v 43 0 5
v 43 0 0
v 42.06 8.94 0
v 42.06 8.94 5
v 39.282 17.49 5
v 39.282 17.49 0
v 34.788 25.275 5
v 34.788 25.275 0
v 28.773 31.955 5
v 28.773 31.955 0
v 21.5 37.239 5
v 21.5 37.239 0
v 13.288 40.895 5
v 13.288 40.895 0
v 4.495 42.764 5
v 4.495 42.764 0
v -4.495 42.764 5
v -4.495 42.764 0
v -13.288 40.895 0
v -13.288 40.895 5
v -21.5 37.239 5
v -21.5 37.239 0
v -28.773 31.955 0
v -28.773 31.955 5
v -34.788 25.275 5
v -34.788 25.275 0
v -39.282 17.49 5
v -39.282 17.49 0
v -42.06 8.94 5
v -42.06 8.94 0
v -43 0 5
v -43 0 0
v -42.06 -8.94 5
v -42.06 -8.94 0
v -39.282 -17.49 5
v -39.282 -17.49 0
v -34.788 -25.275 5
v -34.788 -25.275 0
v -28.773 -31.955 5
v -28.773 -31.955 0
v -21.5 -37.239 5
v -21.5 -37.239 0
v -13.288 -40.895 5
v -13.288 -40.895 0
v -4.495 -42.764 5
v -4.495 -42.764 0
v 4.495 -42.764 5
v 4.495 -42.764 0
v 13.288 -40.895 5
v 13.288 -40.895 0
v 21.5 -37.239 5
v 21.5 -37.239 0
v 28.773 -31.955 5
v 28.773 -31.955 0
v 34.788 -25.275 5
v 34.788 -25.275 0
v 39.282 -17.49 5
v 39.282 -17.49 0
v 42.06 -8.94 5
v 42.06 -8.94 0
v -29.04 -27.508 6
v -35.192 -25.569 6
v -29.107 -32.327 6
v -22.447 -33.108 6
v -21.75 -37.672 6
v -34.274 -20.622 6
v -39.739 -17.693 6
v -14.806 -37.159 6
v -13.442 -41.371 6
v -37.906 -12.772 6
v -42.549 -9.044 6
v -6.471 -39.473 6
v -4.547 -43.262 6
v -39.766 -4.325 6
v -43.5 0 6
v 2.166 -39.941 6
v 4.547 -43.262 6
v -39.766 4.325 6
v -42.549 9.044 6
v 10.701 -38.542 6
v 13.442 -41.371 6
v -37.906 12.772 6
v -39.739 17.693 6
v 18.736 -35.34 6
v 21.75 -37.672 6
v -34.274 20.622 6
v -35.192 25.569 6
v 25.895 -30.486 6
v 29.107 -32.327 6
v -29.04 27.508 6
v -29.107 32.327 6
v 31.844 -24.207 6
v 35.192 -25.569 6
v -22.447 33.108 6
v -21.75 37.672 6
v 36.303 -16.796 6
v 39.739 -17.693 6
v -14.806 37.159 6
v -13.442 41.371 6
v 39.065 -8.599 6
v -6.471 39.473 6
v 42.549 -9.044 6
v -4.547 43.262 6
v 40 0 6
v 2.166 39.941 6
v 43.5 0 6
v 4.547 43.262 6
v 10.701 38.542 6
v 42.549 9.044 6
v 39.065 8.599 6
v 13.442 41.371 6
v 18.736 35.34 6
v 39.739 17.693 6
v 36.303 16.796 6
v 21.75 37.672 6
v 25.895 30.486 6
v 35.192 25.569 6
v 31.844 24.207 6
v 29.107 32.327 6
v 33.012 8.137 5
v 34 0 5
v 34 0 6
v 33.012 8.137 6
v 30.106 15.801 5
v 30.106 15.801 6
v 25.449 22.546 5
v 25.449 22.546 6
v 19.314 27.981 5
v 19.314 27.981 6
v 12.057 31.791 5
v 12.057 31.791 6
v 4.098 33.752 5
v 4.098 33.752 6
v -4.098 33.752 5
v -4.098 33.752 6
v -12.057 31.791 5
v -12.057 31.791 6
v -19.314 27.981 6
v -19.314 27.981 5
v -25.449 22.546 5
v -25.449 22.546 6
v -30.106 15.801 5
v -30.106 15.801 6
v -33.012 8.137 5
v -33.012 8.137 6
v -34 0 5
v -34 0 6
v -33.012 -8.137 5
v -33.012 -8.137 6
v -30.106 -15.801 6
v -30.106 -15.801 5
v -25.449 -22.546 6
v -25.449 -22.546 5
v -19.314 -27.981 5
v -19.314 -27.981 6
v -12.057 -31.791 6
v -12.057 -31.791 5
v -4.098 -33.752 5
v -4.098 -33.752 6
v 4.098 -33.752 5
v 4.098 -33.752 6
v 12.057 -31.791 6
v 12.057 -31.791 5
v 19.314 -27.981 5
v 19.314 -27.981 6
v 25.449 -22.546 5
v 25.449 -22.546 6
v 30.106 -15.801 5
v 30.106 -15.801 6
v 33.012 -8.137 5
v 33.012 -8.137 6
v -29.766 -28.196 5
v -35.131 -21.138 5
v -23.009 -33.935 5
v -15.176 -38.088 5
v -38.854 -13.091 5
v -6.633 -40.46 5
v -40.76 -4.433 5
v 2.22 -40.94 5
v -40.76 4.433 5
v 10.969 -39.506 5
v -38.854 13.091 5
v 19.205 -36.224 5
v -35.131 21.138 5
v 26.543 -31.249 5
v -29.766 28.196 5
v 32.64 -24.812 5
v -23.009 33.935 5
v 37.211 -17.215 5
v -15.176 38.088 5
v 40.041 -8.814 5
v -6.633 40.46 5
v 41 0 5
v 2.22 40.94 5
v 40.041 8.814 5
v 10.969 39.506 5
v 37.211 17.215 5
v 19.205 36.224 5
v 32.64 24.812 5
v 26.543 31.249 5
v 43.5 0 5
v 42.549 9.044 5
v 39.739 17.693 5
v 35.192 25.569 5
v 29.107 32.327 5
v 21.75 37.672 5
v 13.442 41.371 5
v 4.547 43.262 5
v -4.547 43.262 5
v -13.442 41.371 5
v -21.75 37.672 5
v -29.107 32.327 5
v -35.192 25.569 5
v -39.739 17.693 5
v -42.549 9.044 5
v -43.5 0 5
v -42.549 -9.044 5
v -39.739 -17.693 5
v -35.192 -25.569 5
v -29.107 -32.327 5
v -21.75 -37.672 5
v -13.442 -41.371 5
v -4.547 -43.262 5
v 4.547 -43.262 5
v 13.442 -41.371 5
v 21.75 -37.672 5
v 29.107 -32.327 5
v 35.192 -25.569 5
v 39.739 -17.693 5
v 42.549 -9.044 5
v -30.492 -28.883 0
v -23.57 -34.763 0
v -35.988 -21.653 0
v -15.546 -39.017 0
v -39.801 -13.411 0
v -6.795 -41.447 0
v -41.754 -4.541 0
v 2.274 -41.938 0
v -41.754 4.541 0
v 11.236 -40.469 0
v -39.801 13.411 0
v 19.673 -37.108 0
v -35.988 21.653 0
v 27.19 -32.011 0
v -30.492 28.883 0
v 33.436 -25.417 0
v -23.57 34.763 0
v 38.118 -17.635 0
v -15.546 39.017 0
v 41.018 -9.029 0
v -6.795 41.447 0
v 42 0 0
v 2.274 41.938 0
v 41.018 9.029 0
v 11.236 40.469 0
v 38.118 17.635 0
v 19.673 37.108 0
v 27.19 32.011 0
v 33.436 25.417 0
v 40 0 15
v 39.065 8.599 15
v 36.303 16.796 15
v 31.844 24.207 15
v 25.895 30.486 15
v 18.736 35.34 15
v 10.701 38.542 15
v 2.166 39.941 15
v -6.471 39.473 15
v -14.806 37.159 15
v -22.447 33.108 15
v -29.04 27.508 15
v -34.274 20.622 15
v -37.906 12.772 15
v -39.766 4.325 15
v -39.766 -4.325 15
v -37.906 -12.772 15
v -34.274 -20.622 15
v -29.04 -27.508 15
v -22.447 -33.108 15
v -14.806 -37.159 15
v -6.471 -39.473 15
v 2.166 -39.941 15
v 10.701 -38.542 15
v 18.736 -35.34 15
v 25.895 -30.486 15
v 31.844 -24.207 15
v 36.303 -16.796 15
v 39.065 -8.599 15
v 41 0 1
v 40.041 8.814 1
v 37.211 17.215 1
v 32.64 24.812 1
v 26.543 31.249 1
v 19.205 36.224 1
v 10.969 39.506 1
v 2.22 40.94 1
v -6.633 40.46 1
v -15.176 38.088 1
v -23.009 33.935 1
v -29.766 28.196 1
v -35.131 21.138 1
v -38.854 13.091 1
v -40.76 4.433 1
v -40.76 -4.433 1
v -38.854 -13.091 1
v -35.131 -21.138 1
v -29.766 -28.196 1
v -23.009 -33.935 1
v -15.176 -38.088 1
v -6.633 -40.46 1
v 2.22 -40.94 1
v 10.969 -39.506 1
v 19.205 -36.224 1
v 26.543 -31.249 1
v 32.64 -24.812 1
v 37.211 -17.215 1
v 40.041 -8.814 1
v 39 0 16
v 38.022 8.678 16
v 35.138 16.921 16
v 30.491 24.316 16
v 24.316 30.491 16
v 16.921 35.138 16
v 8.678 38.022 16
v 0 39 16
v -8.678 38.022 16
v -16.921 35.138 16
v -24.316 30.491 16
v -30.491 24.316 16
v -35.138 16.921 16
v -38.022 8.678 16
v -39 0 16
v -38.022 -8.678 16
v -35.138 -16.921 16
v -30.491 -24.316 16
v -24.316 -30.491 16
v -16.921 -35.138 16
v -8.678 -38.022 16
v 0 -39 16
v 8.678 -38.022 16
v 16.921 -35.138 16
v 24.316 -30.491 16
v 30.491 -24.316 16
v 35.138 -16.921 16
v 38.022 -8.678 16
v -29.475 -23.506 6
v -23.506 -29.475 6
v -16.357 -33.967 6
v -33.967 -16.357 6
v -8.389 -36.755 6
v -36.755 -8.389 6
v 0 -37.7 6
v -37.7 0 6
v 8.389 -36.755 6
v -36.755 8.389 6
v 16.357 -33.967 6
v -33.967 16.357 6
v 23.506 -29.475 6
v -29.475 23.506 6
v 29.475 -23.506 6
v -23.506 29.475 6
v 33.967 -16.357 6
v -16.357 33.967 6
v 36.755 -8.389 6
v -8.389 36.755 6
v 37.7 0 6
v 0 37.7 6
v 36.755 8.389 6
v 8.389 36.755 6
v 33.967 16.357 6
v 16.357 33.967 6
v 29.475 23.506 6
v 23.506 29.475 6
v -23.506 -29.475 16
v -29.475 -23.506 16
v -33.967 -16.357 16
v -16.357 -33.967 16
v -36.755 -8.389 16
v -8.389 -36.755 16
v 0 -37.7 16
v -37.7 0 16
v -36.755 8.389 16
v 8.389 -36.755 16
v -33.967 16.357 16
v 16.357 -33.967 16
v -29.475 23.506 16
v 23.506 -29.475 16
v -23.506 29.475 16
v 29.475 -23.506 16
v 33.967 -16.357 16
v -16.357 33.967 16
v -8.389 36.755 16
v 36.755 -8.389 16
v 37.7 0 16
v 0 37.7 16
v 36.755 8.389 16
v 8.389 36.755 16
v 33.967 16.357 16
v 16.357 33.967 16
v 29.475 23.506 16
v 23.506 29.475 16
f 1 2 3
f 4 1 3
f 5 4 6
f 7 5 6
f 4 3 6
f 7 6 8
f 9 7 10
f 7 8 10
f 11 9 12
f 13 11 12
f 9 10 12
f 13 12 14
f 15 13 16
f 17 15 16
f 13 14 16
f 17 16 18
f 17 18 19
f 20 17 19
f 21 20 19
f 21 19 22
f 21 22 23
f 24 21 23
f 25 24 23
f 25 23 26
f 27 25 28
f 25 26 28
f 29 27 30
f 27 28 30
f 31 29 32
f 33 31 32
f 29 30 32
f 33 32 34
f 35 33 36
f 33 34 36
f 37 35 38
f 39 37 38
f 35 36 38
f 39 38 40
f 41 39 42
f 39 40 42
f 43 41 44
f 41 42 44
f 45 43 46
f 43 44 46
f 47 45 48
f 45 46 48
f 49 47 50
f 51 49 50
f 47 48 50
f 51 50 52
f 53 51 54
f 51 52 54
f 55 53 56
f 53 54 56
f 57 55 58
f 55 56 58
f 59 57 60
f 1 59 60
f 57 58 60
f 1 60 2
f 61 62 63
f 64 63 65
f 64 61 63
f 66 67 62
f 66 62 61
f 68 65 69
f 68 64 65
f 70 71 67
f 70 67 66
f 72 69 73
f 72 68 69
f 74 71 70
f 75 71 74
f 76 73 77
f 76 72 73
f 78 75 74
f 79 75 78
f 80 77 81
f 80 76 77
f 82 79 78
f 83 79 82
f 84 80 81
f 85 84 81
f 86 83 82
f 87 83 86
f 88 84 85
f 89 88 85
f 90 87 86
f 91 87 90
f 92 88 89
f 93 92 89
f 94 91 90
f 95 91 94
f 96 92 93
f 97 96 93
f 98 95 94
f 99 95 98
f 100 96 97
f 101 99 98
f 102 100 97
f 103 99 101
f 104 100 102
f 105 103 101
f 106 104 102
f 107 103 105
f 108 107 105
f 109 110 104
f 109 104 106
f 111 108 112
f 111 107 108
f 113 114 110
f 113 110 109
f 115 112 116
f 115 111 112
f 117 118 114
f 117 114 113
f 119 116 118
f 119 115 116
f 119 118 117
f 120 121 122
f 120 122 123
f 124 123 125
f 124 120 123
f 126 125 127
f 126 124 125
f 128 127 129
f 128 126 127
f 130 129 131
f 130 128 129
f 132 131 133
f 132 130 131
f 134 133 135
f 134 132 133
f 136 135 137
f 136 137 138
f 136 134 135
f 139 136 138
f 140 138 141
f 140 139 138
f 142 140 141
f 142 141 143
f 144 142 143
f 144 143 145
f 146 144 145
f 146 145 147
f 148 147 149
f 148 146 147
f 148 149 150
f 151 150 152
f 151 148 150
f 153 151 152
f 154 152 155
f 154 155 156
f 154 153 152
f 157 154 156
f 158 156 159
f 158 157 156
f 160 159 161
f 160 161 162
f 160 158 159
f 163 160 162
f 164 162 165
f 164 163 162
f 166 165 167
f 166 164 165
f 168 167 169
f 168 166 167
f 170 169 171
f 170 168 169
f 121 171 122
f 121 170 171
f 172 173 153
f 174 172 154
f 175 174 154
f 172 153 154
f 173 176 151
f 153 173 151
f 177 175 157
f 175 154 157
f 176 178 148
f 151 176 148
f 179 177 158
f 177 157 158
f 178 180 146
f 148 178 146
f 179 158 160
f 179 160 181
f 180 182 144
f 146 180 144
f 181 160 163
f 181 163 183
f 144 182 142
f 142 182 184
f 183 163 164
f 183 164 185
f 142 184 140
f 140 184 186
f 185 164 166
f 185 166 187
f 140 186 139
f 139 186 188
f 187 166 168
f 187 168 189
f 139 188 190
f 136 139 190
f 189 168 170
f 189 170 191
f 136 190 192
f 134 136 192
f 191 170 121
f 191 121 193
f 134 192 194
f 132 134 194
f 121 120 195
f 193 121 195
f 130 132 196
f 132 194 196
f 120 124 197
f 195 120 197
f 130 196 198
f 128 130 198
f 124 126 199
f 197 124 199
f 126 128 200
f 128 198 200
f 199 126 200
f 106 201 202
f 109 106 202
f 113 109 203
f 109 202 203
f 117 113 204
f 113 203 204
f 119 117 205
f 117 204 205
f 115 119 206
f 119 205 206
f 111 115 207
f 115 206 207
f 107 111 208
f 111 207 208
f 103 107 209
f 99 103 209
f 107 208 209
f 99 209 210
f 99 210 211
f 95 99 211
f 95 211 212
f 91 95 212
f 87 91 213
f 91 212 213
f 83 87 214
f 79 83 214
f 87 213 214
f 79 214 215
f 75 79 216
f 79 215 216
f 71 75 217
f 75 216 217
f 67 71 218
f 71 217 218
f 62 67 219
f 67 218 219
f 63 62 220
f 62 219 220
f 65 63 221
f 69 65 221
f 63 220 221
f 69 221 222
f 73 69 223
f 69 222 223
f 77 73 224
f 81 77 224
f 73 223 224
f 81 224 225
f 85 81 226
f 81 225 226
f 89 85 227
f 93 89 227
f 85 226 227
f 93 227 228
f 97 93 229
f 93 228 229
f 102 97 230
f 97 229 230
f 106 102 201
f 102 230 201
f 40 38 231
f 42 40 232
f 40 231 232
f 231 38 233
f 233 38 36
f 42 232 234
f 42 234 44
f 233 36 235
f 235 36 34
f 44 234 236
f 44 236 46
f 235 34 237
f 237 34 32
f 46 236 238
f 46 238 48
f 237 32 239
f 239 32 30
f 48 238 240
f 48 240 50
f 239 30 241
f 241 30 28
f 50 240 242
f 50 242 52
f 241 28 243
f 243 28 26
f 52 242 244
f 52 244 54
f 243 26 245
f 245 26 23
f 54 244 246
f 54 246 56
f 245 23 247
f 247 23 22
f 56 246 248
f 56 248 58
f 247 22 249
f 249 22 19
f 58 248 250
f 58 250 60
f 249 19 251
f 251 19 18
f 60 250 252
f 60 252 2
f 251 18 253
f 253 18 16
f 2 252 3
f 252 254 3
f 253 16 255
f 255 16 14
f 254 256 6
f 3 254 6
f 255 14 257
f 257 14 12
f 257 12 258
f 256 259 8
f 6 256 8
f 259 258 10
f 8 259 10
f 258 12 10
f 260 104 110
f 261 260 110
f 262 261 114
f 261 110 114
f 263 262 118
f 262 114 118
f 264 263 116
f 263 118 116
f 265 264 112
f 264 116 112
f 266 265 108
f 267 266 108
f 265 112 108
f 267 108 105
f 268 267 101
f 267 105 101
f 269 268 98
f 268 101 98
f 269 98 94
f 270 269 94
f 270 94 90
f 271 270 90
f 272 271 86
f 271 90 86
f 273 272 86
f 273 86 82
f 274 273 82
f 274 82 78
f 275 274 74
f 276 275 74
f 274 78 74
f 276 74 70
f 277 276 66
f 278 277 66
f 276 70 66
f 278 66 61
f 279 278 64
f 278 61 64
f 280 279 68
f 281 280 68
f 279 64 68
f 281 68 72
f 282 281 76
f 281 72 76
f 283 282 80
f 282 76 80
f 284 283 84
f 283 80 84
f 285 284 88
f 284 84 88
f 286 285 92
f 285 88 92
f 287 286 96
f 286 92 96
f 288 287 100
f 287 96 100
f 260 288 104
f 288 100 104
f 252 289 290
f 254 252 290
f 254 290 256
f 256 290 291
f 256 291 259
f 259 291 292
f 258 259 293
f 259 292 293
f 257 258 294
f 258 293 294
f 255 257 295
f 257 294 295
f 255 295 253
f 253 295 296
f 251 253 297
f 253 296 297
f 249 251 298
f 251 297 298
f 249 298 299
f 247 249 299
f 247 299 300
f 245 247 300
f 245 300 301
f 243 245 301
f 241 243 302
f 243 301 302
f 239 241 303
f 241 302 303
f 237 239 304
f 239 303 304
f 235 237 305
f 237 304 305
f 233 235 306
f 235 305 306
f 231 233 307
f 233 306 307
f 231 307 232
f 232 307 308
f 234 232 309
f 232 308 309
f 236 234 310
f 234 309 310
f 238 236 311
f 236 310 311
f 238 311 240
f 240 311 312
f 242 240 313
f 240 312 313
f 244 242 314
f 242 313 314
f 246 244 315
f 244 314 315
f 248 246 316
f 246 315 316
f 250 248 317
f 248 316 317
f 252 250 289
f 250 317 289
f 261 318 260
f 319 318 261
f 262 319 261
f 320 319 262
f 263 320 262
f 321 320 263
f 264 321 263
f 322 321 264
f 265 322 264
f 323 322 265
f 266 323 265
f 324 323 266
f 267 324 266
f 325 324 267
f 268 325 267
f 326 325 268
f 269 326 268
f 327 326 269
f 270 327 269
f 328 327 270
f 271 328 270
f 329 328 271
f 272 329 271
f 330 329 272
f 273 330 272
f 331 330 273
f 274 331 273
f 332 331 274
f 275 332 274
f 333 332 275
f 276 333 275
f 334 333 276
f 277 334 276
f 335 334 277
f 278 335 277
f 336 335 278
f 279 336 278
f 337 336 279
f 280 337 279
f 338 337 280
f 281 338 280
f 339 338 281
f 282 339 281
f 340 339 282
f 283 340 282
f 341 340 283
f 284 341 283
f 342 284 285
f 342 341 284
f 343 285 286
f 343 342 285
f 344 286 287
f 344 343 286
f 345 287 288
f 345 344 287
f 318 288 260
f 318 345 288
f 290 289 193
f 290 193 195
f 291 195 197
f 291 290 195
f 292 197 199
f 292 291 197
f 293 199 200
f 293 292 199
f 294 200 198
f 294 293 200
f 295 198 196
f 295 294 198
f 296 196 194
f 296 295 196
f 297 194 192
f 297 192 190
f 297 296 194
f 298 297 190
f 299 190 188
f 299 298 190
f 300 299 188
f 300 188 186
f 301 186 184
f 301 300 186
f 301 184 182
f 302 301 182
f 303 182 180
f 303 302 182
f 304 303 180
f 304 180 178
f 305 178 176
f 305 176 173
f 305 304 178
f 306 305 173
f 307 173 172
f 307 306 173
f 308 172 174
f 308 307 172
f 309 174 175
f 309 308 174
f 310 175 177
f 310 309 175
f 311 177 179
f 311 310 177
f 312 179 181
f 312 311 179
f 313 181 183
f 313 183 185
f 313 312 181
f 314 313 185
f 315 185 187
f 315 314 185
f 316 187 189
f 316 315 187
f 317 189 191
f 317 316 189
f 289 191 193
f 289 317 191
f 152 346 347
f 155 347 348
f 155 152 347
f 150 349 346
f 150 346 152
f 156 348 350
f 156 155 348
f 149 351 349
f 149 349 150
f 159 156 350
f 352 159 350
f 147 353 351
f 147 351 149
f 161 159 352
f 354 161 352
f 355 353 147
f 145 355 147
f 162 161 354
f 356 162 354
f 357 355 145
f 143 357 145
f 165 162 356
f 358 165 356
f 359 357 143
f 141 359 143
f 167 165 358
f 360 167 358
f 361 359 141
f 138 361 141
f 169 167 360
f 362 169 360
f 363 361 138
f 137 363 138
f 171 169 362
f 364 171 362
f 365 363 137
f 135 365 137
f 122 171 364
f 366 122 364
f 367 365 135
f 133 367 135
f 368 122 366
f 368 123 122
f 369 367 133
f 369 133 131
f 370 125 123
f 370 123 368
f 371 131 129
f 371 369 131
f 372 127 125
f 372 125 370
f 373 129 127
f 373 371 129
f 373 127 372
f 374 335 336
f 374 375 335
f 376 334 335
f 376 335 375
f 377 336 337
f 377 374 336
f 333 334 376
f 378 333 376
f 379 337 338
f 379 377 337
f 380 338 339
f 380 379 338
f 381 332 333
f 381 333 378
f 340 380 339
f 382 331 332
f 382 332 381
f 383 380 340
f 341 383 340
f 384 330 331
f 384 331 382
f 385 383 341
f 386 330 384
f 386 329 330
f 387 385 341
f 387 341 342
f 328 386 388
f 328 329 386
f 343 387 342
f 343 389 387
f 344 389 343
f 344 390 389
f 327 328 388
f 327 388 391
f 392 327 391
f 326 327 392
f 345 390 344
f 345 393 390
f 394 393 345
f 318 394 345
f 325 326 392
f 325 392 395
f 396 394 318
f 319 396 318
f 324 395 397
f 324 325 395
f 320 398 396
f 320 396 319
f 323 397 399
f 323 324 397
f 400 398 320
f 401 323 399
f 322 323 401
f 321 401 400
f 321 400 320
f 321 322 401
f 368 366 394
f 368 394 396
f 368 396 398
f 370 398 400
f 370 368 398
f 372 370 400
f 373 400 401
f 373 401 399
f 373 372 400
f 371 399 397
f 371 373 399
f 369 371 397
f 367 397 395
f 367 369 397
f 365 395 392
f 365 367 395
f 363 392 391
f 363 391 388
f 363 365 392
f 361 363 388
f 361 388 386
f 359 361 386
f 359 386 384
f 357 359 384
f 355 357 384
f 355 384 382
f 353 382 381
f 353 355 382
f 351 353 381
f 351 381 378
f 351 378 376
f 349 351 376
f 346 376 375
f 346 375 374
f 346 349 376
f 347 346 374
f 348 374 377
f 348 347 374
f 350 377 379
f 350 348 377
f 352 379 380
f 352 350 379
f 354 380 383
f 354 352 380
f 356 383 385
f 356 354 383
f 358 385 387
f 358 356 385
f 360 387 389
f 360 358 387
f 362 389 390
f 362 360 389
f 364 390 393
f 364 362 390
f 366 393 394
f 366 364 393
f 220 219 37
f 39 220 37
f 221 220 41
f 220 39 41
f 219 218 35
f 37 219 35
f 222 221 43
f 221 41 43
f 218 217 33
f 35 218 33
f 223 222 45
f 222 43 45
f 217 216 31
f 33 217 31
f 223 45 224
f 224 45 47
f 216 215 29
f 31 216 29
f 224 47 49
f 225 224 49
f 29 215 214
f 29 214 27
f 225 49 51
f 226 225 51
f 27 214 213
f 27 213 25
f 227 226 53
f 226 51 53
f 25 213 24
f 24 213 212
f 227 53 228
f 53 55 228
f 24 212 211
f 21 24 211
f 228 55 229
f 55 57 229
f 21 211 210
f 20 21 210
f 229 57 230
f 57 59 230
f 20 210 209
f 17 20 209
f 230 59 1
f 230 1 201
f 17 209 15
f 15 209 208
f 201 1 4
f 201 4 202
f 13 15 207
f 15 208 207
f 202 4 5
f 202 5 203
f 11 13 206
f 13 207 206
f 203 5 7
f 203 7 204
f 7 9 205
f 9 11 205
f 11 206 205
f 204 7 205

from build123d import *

# Parameters (mm, degrees)
SKETCH_R        = 43
SKETCH_R_2      = 41
PAD_DEPTH       = 5
SKETCH001_R     = 43.5
SKETCH001_R_2   = 34
PAD001_DEPTH    = 1
SKETCH002_R     = 40
SKETCH002_R_2   = 37.7
PAD002_DEPTH    = 10
CHAMFER_SIZE    = 1
CHAMFER001_SIZE = 1


with BuildPart() as part:
    # Sketch → Pad (new body)
    with BuildSketch(Plane.XY):
        Circle(SKETCH_R)
        Circle(SKETCH_R_2, mode=Mode.SUBTRACT)
    extrude(amount=PAD_DEPTH)

    # Sketch001 (on Face4 of Pad) → Pad001 (join)
    with BuildSketch(Plane.XY.offset(5)):
        Circle(SKETCH001_R)
        Circle(SKETCH001_R_2, mode=Mode.SUBTRACT)
    extrude(amount=PAD001_DEPTH)

    # Sketch002 (on Face3 of Pad001) → Pad002 (join)
    with BuildSketch(Plane.XY.offset(6)):
        Circle(SKETCH002_R)
        Circle(SKETCH002_R_2, mode=Mode.SUBTRACT)
    extrude(amount=PAD002_DEPTH)

    # Chamfer
    chamfer_edges = [part.edges().sort_by_distance(p)[0] for p in [
        (-40, 0, 16),
    ]]
    chamfer(chamfer_edges, length=CHAMFER_SIZE)

    # Chamfer001
    chamfer001_edges = [part.edges().sort_by_distance(p)[0] for p in [
        (-41, 0, 0),
    ]]
    chamfer(chamfer001_edges, length=CHAMFER001_SIZE)


solid = part.part
